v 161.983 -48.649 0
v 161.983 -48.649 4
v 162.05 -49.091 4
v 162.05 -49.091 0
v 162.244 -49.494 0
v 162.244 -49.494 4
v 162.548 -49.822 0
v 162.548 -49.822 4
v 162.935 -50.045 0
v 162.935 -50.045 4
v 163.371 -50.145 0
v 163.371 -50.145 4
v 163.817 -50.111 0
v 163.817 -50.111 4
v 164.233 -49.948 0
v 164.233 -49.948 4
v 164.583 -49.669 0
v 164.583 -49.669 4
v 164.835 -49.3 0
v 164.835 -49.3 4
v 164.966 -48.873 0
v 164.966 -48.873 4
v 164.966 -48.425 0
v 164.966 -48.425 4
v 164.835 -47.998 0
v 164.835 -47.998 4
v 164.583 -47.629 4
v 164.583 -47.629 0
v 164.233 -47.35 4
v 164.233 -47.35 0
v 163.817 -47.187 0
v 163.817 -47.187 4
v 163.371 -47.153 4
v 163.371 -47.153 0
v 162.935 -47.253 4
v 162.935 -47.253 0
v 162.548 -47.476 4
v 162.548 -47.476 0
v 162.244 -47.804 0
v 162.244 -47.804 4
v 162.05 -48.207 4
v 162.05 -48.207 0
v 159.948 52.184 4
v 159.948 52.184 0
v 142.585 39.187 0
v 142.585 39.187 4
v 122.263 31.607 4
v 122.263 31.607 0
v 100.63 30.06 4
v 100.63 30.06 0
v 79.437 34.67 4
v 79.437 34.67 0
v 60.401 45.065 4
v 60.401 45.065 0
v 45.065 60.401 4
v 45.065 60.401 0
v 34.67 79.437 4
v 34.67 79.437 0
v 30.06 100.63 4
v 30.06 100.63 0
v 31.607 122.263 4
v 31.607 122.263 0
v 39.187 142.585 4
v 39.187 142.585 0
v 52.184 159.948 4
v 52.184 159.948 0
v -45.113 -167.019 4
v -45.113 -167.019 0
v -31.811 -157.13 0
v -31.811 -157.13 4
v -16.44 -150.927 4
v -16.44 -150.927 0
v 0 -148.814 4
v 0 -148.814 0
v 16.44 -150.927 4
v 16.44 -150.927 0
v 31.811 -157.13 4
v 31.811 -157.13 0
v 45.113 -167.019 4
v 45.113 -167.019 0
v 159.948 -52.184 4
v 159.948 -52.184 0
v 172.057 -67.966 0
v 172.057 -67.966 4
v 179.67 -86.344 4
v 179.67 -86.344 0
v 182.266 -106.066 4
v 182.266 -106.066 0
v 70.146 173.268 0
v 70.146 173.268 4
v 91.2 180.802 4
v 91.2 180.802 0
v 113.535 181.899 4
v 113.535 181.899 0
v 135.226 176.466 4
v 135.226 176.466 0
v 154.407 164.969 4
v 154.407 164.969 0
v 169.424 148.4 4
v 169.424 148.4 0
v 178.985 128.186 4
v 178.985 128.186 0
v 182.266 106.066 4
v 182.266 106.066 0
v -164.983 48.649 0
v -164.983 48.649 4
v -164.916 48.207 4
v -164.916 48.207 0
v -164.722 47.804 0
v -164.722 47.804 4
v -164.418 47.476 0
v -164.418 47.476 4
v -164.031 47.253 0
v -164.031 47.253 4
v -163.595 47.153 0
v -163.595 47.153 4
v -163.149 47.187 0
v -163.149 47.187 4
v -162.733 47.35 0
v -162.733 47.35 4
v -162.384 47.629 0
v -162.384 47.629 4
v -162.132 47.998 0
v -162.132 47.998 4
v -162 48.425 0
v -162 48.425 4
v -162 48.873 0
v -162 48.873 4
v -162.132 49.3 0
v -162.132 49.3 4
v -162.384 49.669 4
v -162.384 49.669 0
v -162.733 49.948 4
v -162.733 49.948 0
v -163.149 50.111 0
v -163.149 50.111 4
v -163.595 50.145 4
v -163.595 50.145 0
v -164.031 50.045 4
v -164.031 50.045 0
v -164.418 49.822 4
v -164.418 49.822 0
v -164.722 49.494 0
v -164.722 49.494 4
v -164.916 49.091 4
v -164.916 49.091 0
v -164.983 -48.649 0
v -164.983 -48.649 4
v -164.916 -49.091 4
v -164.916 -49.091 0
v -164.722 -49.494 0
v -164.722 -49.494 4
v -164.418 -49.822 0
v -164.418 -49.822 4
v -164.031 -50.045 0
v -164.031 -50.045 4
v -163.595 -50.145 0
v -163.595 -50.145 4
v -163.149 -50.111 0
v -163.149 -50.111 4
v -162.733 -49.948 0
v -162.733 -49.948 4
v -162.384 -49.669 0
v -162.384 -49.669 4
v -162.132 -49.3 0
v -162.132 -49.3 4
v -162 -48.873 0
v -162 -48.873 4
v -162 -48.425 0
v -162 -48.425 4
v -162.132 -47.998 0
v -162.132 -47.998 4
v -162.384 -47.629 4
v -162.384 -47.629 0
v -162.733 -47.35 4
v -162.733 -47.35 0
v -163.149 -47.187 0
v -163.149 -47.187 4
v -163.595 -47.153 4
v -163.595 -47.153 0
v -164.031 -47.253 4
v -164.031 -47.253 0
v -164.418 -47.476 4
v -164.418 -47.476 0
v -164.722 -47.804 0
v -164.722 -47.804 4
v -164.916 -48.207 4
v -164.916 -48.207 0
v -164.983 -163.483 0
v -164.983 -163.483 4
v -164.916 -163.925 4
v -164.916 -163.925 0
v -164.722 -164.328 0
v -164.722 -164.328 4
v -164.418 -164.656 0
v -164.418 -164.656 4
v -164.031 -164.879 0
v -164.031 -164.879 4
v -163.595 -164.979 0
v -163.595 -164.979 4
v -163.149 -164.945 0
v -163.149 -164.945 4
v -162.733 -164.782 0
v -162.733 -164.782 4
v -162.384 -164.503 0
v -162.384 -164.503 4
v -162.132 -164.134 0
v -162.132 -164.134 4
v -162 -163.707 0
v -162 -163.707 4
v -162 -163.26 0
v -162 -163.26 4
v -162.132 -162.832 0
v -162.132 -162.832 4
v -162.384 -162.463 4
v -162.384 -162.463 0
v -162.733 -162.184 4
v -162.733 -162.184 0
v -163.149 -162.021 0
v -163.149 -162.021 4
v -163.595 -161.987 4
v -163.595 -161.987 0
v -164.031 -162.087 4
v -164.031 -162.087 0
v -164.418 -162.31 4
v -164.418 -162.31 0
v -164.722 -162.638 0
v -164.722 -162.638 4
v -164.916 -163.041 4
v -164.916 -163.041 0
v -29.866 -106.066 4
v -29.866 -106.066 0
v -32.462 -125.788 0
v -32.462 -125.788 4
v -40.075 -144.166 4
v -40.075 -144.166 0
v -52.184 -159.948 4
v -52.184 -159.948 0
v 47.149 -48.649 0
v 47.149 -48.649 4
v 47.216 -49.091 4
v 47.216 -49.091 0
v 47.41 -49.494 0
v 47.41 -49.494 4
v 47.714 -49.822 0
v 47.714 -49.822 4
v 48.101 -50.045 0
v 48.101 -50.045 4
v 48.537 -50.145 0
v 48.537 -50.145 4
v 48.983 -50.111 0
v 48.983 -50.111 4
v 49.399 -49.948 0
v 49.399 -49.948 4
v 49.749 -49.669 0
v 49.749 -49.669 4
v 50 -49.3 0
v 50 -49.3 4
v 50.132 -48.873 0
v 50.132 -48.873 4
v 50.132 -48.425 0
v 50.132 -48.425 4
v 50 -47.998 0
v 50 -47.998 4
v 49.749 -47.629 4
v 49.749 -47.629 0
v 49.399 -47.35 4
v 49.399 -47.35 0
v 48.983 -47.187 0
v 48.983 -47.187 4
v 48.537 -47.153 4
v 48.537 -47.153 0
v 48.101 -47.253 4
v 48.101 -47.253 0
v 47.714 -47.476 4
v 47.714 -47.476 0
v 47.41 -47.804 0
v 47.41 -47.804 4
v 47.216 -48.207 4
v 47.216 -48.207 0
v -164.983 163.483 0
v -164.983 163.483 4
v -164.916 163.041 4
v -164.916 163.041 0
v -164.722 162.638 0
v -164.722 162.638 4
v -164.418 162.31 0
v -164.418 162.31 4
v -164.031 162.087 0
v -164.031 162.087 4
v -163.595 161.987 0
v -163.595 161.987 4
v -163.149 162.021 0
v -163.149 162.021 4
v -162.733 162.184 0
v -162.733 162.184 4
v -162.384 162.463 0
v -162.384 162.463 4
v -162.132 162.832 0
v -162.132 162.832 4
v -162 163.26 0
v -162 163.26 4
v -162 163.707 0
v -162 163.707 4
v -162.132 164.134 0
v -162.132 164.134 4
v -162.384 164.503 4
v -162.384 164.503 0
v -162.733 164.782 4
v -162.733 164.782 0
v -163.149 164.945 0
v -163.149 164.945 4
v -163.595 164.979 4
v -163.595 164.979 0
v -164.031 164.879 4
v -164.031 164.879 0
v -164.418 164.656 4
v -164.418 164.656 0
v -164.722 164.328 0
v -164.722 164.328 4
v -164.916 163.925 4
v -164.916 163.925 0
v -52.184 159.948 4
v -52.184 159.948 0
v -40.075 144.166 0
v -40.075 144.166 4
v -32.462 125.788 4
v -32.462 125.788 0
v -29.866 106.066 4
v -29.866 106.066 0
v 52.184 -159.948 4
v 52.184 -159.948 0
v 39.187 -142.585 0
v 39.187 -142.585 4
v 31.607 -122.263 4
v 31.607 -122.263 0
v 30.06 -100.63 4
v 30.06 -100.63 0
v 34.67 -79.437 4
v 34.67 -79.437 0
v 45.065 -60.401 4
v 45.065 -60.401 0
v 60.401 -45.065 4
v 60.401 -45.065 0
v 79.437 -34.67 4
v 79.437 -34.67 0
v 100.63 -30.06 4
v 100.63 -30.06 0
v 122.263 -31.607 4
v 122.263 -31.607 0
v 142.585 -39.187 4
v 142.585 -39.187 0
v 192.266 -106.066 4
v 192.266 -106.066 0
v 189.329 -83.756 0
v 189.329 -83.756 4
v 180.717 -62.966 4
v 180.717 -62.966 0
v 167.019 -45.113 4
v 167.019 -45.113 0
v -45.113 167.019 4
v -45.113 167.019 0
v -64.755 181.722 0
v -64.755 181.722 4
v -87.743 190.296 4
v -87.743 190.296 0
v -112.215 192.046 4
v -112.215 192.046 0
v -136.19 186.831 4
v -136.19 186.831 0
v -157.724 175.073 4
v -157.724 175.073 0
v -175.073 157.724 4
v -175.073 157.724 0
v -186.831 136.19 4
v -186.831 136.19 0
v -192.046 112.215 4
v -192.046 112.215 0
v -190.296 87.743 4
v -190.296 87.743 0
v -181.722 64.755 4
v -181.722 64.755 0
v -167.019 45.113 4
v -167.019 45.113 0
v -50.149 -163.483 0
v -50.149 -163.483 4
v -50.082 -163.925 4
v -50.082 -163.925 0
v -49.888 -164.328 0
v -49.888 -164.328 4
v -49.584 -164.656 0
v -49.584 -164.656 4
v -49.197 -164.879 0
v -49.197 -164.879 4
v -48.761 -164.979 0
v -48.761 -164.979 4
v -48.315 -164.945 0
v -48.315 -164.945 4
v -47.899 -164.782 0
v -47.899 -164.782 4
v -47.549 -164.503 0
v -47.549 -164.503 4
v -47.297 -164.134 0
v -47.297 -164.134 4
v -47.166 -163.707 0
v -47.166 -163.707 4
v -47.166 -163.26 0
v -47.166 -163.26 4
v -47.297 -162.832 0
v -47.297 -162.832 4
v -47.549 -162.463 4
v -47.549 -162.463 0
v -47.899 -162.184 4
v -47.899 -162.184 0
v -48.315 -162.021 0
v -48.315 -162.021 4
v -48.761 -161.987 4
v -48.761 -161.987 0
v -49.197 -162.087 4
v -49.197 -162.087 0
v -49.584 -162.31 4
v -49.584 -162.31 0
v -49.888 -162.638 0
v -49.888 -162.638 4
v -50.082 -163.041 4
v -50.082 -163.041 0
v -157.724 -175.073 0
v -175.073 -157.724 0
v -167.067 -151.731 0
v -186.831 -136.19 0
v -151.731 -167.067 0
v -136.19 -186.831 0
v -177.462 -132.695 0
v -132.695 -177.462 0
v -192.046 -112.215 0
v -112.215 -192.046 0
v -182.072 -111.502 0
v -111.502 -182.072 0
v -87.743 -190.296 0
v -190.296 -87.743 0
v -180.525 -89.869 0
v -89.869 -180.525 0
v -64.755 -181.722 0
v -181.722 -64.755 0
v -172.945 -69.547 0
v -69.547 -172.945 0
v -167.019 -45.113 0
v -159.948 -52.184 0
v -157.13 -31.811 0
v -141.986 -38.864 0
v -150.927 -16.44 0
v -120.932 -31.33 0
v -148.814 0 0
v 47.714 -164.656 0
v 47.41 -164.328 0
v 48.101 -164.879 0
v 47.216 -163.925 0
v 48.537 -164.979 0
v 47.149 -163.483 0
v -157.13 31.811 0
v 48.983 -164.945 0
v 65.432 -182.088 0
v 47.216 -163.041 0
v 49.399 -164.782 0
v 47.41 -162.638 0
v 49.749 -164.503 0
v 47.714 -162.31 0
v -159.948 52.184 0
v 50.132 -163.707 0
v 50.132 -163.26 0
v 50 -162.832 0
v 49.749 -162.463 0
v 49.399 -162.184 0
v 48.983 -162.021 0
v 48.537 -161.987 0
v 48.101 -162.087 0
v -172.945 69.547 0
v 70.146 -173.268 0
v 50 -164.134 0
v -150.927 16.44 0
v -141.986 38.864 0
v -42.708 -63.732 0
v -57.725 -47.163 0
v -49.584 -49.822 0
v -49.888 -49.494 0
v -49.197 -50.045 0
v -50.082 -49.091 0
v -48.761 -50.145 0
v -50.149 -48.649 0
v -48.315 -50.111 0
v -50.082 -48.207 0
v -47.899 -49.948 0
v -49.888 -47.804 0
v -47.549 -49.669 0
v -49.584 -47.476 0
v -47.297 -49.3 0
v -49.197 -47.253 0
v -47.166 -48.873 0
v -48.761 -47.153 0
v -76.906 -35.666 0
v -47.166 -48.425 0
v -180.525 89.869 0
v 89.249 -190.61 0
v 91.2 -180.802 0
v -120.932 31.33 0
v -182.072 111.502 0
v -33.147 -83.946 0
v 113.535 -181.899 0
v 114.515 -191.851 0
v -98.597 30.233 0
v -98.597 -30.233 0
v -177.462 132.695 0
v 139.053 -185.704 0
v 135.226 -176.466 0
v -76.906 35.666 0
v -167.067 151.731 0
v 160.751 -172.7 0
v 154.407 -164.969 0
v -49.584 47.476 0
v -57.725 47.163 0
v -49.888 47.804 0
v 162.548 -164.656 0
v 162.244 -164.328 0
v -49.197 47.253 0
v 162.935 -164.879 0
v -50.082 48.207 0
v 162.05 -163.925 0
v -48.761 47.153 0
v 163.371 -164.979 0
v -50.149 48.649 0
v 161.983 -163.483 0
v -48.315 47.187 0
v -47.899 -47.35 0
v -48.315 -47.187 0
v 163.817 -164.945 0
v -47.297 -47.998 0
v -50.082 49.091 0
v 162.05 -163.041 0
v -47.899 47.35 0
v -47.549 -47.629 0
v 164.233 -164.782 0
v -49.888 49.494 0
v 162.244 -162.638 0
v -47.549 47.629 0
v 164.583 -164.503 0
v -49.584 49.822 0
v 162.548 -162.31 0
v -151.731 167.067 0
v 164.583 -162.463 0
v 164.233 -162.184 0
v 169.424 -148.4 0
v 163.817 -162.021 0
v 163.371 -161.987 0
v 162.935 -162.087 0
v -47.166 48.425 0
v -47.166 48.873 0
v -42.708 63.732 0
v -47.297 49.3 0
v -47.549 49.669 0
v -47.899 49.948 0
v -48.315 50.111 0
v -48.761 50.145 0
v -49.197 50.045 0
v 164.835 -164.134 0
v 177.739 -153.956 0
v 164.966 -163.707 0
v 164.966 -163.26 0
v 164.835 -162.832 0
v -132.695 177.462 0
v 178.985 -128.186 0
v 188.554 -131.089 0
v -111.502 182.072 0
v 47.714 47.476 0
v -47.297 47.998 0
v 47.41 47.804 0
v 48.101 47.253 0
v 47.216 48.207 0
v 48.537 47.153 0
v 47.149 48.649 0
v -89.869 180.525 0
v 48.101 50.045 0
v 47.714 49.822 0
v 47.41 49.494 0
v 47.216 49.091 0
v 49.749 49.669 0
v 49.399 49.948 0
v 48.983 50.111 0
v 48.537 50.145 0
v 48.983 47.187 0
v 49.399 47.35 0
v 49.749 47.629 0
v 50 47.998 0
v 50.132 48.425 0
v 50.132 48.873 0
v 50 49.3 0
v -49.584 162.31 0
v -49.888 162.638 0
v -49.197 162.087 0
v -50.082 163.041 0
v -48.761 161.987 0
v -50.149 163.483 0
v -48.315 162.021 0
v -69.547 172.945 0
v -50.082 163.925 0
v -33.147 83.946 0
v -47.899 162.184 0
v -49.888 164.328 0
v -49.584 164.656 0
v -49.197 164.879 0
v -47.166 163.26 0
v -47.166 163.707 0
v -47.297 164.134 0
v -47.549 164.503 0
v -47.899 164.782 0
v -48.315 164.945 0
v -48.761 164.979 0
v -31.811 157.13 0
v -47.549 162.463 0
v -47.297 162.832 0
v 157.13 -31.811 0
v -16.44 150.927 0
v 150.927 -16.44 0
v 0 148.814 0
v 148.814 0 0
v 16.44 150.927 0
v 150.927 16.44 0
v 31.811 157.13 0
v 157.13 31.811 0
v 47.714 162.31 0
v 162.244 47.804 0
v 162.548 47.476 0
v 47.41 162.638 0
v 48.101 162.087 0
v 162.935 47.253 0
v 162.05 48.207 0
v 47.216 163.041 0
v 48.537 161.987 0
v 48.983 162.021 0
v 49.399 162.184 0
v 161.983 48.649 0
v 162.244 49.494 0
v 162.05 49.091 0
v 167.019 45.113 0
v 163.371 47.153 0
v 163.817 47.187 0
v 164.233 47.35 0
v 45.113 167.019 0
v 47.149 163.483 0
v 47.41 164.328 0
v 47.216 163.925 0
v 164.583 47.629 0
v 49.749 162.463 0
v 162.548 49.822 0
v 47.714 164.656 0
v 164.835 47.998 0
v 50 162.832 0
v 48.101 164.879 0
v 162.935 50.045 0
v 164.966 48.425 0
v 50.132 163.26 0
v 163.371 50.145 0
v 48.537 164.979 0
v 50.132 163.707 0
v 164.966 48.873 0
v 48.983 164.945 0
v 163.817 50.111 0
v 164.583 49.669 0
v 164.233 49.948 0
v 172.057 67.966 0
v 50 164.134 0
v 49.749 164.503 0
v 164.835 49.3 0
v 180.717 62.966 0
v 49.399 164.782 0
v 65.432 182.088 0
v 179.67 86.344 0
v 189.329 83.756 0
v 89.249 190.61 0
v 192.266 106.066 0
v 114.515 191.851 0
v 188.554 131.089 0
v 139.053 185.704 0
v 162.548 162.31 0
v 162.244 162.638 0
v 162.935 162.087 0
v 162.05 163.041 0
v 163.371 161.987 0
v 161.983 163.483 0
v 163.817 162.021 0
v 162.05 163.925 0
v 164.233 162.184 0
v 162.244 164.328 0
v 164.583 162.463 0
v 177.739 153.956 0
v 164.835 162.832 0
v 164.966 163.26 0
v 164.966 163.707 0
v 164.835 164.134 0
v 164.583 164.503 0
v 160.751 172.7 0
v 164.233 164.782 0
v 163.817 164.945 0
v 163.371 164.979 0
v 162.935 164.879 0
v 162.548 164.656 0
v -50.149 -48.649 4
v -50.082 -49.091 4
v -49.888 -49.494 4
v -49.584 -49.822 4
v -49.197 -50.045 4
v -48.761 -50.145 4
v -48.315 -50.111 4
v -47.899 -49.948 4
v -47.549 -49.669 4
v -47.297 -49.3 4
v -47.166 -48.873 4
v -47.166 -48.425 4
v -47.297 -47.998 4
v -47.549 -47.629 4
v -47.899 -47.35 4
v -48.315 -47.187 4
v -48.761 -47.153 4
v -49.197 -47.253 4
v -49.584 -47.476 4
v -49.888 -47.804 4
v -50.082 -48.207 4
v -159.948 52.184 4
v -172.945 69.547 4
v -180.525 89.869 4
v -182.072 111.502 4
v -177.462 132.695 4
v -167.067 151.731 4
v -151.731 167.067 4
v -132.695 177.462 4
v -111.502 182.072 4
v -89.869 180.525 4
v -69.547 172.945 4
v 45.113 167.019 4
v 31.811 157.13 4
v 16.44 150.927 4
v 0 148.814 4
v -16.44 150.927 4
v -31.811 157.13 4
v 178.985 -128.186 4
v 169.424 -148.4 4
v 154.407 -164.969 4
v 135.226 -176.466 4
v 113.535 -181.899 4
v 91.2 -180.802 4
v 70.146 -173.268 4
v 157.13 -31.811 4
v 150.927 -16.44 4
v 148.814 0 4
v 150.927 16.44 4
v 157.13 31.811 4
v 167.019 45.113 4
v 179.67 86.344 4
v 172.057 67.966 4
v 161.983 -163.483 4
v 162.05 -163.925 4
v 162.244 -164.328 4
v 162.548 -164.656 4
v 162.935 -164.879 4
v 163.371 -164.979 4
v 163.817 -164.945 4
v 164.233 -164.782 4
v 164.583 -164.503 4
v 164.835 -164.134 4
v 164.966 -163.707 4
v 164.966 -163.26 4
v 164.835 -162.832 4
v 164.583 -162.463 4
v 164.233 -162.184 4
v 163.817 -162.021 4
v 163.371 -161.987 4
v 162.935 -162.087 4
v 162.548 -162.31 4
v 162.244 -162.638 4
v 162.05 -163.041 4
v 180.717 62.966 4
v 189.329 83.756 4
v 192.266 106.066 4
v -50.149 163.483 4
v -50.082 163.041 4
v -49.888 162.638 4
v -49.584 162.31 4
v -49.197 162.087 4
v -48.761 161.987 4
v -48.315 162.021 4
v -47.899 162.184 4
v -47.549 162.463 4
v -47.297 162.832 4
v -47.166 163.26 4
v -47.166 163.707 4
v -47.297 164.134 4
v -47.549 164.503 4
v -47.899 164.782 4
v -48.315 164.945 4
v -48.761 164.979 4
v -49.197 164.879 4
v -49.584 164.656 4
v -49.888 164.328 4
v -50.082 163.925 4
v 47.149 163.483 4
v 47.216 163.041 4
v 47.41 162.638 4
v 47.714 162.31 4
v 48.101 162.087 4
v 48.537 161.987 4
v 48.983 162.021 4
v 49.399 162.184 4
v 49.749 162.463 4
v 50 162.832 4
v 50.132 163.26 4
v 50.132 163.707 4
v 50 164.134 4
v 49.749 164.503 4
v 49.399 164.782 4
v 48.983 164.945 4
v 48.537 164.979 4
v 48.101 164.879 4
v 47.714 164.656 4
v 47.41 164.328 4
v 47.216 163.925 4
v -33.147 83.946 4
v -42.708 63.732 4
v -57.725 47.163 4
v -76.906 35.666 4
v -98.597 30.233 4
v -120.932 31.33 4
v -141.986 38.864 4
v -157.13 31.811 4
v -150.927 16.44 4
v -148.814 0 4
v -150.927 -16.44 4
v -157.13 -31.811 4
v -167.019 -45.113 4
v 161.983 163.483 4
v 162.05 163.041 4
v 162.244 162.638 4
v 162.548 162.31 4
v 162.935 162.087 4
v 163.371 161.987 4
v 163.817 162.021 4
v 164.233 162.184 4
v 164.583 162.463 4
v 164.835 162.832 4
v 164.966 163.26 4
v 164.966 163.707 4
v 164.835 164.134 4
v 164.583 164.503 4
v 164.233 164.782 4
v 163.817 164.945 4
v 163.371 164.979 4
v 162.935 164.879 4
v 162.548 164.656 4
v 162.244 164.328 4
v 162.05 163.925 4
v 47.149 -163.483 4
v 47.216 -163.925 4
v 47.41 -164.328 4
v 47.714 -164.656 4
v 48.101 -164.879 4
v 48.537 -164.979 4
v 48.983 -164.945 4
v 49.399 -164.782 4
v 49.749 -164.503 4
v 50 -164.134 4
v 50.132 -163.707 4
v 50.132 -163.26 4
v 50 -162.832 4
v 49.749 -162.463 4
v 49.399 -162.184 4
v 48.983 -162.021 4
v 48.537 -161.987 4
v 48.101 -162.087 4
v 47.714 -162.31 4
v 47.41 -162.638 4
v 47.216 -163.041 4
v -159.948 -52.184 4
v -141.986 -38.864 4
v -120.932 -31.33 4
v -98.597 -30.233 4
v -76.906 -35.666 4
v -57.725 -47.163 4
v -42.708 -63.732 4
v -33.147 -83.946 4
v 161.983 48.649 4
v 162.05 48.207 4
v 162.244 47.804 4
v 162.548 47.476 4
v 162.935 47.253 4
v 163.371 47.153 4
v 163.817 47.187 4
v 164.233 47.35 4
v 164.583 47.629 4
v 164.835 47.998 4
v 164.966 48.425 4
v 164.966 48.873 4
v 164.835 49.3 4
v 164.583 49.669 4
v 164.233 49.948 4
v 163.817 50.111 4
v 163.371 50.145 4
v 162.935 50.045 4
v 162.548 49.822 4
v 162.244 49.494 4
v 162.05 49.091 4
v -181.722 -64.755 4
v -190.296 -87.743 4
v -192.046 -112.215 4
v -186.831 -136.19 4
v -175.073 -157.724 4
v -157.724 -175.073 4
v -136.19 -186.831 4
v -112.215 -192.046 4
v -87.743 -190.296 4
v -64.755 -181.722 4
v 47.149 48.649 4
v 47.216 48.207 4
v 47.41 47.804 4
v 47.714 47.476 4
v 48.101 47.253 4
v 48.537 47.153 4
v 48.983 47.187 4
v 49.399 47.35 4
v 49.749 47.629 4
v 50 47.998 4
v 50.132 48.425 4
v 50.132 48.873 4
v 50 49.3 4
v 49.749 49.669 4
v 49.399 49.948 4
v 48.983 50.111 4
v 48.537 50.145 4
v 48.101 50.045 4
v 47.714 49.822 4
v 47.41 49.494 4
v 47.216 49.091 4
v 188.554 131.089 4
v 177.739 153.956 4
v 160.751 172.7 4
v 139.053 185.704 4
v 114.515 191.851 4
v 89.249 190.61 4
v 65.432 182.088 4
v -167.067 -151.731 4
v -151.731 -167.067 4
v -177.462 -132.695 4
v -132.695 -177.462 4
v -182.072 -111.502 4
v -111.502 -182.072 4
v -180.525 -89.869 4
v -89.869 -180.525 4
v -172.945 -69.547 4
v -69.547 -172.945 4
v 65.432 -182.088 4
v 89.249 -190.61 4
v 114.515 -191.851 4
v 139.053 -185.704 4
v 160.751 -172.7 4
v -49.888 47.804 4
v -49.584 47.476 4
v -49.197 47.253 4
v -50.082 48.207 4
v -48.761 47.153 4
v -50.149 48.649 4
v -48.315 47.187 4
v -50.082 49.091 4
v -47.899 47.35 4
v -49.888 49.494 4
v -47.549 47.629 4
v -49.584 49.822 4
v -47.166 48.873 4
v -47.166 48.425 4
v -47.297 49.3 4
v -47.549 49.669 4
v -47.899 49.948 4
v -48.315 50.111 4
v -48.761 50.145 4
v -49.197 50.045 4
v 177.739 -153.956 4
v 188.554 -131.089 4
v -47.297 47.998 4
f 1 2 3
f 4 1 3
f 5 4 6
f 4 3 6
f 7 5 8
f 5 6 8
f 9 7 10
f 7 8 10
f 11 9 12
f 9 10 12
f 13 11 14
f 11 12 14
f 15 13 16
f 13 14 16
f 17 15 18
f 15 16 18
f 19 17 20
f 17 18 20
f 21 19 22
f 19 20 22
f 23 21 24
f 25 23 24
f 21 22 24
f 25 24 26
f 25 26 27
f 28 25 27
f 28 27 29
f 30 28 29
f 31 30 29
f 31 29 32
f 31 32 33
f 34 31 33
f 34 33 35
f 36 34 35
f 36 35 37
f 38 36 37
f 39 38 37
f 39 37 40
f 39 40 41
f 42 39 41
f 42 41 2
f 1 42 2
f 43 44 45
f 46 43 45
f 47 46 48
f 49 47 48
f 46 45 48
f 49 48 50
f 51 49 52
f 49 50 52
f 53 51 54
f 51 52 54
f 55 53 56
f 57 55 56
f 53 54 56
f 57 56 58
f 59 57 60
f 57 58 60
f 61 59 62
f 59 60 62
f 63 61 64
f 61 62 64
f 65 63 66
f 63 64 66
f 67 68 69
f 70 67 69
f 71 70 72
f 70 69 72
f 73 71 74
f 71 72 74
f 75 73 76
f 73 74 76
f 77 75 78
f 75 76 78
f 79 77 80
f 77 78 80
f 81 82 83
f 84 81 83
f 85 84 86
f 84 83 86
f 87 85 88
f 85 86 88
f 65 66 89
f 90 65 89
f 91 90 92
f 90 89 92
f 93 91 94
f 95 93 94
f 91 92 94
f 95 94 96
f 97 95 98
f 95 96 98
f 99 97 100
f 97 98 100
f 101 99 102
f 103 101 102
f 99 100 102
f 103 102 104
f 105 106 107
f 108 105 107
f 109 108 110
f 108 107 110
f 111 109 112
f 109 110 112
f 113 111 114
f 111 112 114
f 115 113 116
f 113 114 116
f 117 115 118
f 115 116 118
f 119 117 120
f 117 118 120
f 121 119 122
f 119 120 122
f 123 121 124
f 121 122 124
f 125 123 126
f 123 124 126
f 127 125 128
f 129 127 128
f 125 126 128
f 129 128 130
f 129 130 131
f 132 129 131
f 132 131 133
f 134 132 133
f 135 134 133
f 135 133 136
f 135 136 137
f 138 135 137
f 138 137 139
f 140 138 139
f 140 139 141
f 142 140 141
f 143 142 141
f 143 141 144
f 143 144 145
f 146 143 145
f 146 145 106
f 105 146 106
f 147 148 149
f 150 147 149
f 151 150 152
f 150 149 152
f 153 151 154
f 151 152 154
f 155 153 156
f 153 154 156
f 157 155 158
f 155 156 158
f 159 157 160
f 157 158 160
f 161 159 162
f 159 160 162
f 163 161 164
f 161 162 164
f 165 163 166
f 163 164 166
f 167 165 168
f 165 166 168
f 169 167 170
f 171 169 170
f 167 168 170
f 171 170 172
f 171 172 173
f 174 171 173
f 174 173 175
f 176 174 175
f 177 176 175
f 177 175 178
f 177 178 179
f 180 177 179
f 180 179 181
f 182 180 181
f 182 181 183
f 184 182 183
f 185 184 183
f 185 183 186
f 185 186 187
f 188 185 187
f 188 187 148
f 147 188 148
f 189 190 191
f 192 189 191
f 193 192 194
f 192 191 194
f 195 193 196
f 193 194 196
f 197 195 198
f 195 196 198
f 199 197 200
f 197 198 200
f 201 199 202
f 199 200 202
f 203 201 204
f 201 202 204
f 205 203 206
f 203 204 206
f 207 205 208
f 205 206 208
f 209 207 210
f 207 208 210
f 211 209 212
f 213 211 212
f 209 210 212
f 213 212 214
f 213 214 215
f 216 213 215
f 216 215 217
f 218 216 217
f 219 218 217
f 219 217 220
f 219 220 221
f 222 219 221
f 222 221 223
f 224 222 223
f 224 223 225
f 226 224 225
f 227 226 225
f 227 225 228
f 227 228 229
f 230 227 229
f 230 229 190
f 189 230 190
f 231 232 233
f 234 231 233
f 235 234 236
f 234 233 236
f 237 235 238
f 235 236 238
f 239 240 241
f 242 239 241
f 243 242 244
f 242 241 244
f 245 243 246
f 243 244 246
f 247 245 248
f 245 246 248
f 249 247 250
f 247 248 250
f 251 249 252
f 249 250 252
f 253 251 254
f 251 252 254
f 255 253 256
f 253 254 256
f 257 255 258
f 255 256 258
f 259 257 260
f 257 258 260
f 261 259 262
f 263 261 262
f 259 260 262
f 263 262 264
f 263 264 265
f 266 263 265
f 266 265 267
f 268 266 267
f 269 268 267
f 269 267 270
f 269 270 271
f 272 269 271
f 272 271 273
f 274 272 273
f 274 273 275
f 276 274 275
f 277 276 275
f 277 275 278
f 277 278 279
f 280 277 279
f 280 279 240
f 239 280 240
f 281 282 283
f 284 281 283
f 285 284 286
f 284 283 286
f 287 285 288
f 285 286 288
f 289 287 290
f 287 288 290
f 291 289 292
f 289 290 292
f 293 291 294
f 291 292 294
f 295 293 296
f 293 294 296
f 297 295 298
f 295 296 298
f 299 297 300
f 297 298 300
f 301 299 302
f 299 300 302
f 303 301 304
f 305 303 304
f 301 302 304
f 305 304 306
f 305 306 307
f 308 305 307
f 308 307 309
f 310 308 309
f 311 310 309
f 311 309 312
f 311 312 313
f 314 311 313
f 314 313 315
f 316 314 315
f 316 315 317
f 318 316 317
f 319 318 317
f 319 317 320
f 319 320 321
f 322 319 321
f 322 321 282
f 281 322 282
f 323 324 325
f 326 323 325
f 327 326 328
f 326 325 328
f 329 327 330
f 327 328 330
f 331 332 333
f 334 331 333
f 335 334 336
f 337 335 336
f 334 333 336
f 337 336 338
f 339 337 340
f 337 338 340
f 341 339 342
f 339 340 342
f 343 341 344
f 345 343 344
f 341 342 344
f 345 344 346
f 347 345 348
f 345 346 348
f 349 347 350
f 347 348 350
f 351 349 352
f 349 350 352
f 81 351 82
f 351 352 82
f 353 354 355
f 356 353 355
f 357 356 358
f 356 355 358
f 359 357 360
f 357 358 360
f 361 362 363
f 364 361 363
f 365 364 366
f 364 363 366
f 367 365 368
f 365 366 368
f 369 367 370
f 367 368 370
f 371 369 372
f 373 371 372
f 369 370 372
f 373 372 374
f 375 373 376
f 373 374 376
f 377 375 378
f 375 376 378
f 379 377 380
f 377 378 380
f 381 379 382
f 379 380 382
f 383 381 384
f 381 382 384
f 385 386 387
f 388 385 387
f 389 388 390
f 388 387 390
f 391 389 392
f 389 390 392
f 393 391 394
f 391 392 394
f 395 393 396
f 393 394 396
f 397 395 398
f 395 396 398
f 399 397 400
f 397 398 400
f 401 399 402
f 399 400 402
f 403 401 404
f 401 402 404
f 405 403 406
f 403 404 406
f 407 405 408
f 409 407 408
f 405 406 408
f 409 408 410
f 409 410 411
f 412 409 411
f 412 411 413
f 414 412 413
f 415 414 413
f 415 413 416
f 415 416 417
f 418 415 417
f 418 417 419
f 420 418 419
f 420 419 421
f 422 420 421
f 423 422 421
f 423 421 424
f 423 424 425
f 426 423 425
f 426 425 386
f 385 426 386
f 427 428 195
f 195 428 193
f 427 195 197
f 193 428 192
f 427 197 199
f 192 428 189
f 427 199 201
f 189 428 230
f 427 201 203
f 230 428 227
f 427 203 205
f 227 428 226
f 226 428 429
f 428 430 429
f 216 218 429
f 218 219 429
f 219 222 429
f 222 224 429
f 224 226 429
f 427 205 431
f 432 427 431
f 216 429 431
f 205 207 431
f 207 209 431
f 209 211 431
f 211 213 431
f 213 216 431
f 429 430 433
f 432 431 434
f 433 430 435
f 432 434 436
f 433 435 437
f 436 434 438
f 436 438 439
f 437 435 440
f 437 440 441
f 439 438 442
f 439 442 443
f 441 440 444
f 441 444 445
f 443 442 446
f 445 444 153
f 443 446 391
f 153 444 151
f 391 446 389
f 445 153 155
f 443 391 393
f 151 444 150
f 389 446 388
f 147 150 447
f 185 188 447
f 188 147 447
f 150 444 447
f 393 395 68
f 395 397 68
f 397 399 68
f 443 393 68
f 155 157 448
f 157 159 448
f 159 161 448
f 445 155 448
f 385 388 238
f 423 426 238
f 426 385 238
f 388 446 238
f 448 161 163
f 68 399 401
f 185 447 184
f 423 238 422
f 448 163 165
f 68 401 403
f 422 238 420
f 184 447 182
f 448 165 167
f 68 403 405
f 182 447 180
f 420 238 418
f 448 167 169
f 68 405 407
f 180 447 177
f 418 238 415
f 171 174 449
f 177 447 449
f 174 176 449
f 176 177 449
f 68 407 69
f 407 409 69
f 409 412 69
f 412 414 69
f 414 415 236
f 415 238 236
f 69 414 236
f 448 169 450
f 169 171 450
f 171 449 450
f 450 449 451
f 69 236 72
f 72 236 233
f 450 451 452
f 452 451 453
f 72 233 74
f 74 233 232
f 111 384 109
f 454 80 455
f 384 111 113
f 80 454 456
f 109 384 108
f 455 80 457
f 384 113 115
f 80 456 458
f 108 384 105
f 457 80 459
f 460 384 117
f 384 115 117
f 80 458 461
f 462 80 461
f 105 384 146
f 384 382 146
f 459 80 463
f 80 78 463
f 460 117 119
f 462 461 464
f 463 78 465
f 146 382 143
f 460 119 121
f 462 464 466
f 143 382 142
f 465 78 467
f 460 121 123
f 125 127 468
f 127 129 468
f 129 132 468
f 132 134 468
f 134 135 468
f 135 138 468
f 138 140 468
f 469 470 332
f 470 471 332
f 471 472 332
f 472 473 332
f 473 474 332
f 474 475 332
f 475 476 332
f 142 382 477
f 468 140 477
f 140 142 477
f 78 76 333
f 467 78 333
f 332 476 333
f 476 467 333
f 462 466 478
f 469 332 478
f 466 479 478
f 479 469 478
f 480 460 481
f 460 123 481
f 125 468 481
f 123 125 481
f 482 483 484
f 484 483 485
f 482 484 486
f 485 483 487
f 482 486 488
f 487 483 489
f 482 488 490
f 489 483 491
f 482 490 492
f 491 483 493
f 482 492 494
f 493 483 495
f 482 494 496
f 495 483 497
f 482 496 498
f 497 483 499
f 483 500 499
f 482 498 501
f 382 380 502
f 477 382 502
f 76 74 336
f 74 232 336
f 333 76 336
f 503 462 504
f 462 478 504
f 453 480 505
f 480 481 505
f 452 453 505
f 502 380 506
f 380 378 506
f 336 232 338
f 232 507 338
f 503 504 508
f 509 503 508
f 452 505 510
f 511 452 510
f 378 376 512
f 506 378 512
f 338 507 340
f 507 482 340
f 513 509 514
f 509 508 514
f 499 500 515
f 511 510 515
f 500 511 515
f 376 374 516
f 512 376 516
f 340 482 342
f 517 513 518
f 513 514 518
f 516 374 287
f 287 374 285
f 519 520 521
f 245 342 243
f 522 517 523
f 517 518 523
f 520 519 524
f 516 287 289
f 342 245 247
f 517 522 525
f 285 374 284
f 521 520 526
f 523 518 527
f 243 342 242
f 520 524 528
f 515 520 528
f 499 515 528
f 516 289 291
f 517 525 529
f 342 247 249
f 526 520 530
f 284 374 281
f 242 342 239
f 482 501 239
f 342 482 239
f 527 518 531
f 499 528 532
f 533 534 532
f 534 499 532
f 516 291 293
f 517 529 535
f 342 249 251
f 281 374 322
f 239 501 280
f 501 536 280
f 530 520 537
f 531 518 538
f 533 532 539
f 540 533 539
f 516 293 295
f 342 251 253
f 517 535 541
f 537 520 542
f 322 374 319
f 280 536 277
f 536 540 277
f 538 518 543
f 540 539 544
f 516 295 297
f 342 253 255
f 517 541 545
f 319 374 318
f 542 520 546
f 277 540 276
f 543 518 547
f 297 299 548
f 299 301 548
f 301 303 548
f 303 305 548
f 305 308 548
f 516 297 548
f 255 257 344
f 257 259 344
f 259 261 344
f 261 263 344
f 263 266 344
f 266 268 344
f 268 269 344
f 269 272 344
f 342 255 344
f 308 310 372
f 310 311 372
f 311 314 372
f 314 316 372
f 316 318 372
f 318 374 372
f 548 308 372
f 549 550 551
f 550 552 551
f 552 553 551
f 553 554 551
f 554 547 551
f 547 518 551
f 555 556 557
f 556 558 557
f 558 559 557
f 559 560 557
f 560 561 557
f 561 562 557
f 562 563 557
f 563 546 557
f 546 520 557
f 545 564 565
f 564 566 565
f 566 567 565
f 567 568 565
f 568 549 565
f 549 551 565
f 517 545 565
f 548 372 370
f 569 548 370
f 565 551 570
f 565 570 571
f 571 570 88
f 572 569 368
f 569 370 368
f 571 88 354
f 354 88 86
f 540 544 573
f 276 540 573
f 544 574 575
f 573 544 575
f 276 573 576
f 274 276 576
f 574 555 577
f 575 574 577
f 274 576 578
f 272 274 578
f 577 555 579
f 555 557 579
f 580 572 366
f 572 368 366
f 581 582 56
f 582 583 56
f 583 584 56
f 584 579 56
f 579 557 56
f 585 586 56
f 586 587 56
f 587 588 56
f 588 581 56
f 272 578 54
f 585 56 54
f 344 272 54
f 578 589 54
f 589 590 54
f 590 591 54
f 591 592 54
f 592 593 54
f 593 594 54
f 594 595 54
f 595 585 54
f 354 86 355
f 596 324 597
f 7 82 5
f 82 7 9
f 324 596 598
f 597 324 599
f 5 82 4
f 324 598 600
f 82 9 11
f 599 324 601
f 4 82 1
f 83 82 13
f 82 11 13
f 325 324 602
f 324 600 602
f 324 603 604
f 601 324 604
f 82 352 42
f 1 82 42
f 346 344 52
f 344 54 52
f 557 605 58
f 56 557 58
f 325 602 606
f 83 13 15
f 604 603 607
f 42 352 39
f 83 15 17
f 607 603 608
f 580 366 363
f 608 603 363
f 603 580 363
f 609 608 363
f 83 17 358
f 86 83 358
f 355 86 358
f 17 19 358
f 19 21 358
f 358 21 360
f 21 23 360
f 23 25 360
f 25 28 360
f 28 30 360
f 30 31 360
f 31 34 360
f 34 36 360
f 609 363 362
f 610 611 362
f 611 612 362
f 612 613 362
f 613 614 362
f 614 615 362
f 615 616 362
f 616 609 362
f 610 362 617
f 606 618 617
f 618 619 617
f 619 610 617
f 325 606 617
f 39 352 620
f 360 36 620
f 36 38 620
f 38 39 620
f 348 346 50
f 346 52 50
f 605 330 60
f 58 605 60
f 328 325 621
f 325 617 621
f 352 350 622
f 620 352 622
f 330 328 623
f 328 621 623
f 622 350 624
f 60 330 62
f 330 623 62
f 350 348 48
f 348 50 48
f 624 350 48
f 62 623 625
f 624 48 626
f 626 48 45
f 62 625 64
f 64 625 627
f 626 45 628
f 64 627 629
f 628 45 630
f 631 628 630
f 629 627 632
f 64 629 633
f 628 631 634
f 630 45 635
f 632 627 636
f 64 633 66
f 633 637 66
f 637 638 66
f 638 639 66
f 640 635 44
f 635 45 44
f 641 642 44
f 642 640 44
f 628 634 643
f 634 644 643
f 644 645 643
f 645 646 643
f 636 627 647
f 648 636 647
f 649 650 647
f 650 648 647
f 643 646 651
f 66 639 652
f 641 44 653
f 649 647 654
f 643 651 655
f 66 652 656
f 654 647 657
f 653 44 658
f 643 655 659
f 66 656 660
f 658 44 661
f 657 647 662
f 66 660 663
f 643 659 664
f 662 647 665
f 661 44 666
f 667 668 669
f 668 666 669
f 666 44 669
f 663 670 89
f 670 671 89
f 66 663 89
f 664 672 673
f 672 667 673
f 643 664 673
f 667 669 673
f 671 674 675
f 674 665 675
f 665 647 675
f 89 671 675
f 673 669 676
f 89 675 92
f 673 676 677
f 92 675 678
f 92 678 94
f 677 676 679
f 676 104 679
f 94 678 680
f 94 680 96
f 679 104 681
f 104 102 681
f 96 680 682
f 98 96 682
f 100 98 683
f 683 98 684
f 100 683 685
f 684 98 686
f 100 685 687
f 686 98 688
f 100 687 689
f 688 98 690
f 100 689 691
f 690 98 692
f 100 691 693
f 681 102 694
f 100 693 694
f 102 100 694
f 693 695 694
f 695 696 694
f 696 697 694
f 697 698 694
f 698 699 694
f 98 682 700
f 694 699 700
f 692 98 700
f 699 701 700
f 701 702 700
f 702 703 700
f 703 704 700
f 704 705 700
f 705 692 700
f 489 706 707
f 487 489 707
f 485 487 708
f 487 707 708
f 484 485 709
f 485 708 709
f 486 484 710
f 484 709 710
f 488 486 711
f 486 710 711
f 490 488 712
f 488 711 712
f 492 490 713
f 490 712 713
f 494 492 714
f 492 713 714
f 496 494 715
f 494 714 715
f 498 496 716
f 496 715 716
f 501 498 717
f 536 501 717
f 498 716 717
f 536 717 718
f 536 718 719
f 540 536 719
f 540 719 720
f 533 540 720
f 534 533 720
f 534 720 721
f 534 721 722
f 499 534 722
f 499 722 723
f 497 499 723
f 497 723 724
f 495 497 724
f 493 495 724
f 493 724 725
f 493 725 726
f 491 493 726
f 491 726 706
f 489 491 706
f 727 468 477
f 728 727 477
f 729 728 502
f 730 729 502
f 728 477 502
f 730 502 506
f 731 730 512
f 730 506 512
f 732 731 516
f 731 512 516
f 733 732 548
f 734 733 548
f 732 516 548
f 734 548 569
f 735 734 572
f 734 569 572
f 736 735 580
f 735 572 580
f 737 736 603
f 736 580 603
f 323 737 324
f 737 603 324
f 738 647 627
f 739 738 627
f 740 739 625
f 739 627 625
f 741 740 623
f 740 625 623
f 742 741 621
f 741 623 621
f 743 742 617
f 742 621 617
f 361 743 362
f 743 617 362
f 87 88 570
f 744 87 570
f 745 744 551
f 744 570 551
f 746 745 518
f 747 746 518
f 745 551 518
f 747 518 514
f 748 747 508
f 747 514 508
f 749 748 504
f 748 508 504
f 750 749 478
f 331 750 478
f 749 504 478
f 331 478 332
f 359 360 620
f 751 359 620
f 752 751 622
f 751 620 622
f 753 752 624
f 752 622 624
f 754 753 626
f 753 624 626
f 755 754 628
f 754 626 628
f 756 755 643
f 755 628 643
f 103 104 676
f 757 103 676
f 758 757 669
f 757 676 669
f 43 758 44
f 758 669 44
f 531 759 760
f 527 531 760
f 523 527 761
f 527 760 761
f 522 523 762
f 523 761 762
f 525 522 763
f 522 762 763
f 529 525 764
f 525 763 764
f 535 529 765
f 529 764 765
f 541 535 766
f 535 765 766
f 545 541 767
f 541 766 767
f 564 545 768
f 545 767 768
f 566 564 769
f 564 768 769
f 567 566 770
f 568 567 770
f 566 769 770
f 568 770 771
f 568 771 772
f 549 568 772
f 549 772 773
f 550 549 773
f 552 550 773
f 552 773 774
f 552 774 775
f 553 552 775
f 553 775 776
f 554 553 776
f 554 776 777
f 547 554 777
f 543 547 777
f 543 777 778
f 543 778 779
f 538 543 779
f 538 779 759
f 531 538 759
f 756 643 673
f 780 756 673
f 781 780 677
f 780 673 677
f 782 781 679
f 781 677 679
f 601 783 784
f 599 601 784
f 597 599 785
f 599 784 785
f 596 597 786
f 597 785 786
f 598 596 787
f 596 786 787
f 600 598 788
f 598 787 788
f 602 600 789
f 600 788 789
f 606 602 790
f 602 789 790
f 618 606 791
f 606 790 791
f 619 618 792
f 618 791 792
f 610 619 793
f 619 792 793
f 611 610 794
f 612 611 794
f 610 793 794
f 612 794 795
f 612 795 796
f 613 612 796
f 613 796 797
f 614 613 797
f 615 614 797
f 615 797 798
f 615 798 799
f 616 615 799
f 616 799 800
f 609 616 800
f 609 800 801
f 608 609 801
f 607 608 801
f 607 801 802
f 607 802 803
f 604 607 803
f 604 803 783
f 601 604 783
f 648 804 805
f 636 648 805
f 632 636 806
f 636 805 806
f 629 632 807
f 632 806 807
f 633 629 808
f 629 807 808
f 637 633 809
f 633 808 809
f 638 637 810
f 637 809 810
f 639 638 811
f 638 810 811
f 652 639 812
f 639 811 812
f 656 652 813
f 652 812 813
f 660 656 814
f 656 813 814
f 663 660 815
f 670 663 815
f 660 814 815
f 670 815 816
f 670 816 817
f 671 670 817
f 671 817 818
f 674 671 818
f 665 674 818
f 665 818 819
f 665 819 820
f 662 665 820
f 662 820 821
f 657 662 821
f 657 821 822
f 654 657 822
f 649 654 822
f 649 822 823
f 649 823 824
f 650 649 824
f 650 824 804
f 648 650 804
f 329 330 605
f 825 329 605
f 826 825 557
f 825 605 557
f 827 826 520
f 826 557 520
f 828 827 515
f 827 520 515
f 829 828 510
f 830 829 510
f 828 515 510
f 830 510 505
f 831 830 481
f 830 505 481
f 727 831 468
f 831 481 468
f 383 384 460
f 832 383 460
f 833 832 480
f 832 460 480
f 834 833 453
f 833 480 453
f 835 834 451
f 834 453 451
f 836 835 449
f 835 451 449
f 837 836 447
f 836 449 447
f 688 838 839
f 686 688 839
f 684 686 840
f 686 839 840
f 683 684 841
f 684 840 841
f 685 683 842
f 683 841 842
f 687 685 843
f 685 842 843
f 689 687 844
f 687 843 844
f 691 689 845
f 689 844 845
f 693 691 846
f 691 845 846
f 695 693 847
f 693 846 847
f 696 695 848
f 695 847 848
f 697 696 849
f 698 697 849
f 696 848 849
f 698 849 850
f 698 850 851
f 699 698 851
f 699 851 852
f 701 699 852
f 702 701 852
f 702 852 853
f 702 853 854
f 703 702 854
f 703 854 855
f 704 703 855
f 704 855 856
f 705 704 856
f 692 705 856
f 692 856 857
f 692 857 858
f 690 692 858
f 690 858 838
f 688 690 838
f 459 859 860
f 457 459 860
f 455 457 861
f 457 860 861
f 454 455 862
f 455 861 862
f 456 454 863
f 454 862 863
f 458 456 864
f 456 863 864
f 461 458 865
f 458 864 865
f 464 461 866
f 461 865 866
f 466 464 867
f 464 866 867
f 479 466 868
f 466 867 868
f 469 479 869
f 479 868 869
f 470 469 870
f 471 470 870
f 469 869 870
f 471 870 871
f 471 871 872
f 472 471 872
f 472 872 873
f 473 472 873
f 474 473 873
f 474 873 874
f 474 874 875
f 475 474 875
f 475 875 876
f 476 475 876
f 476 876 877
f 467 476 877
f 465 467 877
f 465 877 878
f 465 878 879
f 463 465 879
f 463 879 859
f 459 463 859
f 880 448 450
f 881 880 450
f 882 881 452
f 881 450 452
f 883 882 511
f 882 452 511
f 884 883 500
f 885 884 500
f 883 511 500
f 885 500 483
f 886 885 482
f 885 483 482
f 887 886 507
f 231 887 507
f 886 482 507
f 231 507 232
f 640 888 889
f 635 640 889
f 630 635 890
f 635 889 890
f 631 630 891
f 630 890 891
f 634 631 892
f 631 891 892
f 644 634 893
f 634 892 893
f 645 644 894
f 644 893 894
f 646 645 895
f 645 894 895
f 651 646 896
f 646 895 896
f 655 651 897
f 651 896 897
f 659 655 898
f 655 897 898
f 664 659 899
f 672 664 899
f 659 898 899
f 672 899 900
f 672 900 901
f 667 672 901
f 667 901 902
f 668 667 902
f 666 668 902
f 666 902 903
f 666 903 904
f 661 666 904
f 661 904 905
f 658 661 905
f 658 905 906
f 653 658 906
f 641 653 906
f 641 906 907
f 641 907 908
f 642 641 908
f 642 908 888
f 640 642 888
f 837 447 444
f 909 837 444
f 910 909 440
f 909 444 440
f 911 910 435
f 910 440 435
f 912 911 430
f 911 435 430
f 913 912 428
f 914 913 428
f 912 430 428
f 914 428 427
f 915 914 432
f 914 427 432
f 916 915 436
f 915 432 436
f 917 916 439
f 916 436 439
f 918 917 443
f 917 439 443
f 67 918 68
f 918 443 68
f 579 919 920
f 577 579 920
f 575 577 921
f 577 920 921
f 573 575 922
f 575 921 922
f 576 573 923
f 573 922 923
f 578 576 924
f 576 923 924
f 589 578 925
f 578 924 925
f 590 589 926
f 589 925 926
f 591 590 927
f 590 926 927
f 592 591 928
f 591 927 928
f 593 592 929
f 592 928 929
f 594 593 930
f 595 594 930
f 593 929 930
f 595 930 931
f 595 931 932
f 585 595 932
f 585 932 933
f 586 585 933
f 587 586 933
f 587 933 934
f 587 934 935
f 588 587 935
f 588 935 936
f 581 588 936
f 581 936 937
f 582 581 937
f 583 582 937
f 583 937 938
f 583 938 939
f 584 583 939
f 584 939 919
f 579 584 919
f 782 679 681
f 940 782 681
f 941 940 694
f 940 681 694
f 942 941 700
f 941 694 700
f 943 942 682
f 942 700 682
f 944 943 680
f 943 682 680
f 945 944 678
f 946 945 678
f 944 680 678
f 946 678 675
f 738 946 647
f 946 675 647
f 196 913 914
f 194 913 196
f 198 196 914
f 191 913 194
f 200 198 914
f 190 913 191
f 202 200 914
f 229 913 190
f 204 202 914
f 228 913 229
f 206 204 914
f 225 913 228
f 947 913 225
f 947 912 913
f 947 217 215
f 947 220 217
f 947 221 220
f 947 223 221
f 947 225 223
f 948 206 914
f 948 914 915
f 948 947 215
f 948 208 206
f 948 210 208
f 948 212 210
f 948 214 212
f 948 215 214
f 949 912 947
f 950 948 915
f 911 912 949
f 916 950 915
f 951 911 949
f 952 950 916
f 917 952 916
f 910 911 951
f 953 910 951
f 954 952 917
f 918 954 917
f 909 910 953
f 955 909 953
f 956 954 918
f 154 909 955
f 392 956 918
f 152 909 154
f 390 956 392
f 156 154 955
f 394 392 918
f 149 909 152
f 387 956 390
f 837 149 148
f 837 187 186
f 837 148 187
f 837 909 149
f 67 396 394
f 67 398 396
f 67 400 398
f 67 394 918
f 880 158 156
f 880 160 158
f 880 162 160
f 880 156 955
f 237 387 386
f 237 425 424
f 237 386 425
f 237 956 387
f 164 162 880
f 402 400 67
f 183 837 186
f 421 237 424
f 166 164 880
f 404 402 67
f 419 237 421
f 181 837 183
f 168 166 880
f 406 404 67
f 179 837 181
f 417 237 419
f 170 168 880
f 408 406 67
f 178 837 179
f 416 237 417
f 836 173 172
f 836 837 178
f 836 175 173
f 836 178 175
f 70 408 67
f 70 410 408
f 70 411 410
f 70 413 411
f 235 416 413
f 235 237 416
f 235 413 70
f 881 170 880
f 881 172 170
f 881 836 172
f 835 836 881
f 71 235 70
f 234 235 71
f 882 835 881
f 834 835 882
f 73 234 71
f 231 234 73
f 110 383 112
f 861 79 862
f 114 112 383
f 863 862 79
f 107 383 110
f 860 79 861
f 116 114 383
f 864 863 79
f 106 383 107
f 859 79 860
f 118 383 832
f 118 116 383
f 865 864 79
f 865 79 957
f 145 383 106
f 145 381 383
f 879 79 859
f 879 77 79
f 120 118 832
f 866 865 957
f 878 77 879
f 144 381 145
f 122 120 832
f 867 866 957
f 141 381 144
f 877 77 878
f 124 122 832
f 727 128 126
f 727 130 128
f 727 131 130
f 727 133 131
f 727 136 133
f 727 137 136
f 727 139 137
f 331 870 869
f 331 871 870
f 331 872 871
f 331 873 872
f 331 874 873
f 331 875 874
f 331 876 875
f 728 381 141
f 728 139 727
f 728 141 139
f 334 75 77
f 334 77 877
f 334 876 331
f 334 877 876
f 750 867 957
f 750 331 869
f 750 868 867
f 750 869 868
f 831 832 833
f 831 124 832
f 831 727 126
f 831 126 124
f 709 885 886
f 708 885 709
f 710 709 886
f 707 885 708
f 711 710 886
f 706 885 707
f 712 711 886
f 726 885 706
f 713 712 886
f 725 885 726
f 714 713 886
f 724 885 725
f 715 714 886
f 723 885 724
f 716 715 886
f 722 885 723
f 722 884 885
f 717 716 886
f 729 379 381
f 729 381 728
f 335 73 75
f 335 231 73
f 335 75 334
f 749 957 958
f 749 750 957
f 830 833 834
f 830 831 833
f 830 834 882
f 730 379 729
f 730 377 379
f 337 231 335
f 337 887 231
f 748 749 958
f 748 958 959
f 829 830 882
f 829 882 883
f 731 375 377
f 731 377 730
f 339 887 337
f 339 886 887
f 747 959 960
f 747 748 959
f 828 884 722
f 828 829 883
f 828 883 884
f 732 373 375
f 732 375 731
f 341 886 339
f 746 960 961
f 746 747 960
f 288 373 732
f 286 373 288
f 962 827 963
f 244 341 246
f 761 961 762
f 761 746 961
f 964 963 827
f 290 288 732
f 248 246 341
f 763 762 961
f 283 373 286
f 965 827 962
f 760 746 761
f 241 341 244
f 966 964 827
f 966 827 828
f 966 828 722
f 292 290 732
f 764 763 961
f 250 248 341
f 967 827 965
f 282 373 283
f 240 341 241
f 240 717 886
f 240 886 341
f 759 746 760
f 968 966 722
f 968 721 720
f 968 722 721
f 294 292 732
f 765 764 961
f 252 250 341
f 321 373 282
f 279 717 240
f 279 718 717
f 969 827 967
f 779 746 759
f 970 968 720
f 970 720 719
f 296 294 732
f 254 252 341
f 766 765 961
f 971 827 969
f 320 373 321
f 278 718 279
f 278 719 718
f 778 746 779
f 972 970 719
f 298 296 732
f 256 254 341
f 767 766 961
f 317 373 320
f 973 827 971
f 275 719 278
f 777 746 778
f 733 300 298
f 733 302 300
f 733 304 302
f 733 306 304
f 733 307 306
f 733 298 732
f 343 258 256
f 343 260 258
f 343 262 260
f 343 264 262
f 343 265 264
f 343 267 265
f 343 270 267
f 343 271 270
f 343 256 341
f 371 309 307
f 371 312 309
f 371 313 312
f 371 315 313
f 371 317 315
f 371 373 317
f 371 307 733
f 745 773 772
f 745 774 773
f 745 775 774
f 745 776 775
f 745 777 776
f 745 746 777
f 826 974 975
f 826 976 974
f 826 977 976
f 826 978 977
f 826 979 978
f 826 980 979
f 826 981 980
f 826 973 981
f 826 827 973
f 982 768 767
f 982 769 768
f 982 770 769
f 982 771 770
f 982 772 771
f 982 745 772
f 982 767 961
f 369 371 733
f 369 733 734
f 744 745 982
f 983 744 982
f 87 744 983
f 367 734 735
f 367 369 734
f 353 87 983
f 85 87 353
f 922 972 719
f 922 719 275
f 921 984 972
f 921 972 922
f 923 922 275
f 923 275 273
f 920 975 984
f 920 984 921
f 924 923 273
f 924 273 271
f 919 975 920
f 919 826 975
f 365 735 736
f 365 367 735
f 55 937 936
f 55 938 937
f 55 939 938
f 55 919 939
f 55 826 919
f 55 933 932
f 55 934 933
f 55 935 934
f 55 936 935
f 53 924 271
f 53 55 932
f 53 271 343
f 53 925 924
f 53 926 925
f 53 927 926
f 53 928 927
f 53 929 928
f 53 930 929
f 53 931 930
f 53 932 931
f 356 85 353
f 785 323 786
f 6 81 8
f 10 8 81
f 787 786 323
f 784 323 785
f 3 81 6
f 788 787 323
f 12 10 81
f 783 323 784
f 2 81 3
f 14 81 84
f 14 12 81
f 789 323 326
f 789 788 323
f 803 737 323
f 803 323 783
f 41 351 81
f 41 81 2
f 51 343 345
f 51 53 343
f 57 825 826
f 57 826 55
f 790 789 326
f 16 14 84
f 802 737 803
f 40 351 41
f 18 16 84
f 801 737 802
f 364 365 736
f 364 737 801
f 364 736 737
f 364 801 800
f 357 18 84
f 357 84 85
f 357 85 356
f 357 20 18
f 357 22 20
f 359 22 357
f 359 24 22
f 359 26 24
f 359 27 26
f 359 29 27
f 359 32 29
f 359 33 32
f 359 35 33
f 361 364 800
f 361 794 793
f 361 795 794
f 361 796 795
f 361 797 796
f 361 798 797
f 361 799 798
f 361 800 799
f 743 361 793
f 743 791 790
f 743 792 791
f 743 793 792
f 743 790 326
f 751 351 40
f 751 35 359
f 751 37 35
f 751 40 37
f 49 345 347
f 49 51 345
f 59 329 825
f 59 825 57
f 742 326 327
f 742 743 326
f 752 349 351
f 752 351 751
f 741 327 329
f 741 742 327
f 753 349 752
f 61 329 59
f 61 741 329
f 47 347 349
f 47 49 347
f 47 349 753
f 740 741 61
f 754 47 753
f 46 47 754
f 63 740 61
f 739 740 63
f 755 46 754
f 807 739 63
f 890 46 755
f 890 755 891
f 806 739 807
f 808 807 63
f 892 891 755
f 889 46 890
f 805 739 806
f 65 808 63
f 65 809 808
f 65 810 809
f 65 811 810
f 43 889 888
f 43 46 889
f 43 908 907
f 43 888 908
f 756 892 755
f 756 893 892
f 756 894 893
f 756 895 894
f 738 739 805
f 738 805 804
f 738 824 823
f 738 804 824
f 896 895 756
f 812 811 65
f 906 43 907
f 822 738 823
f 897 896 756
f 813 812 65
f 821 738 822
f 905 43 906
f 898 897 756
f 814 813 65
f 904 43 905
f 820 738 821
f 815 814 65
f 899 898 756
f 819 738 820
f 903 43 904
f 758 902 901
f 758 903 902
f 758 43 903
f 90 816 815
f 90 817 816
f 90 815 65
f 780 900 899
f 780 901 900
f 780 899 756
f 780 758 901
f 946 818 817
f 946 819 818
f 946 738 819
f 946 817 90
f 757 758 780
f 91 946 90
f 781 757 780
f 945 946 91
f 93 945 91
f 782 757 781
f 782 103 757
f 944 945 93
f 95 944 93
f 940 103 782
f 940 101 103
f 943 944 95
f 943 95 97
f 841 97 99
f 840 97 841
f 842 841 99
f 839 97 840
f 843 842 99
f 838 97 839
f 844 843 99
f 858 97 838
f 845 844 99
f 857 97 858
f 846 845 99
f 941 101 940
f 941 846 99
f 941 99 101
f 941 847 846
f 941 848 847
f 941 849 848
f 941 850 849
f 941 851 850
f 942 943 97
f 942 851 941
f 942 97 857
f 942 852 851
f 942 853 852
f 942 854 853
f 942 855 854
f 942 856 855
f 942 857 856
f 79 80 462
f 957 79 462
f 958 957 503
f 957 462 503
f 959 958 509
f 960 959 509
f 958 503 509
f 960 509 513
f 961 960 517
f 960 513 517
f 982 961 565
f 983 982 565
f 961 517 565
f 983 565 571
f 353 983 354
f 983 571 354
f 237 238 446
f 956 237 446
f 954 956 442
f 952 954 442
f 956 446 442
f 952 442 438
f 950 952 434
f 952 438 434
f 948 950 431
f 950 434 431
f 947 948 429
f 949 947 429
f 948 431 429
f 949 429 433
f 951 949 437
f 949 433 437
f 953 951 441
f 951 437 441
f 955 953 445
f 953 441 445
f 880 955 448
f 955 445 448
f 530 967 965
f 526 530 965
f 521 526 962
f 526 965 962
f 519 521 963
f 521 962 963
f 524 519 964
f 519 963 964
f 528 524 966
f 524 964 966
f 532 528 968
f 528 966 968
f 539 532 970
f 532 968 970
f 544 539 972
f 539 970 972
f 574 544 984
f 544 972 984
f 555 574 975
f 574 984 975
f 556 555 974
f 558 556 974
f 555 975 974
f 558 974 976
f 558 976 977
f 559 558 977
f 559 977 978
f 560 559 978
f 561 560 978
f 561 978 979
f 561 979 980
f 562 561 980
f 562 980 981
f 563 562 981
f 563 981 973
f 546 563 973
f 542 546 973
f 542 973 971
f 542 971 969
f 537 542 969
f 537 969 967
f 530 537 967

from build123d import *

# Parameters (mm, degrees)
F1_DEPTH = 4
F2_D     = 3


with BuildPart() as f1:
    # F0 (on Top) → F1 (new body)
    with BuildSketch(Plane.XY):
        with BuildLine():
            ThreePointArc((-52.18448, 159.947554), (-35.666397, 135.226495), (-29.866017, 106.066017))
            ThreePointArc((-29.866017, 106.066017), (-76.90554, 35.666397), (-159.947554, 52.18448))
            Line((-159.947554, 52.18448), (-167.018622, 45.113413))
            ThreePointArc((-167.018622, 45.113413), (-73.078705, 26.427601), (-19.866017, 106.066017))
            ThreePointArc((-19.866017, 106.066017), (-26.427601, 139.053329), (-45.113413, 167.018622))
            Line((-45.113413, 167.018622), (-52.18448, 159.947554))
        make_face()
        with BuildLine():
            ThreePointArc((-159.947554, 52.18448), (-159.947554, 159.947554), (-52.18448, 159.947554))
            Line((-52.18448, 159.947554), (-45.113413, 167.018622))
            ThreePointArc((-45.113413, 167.018622), (-167.018622, 167.018622), (-167.018622, 45.113413))
            Line((-167.018622, 45.113413), (-159.947554, 52.18448))
        make_face()
        with BuildLine():
            ThreePointArc((45.113413, 167.018622), (0, 148.813707), (-45.113413, 167.018622))
            ThreePointArc((-45.113413, 167.018622), (-26.427601, 139.053329), (-19.866017, 106.066017))
            ThreePointArc((-19.866017, 106.066017), (-73.078705, 26.427601), (-167.018622, 45.113413))
            ThreePointArc((-167.018622, 45.113413), (-148.813707, 0), (-167.018622, -45.113413))
            ThreePointArc((-167.018622, -45.113413), (-73.078705, -26.427601), (-19.866017, -106.066017))
            ThreePointArc((-19.866017, -106.066017), (-26.427601, -139.053329), (-45.113413, -167.018622))
            ThreePointArc((-45.113413, -167.018622), (0, -148.813707), (45.113413, -167.018622))
            ThreePointArc((45.113413, -167.018622), (45.113413, -45.113413), (167.018622, -45.113413))
            ThreePointArc((167.018622, -45.113413), (148.813707, 0), (167.018622, 45.113413))
            ThreePointArc((167.018622, 45.113413), (45.113413, 45.113413), (45.113413, 167.018622))
        make_face()
        with BuildLine():
            Line((52.18448, 159.947554), (45.113413, 167.018622))
            ThreePointArc((45.113413, 167.018622), (45.113413, 45.113413), (167.018622, 45.113413))
            Line((167.018622, 45.113413), (159.947554, 52.18448))
            ThreePointArc((159.947554, 52.18448), (52.18448, 52.18448), (52.18448, 159.947554))
        make_face()
        with BuildLine():
            ThreePointArc((192.266017, 106.066017), (139.053329, 185.704433), (45.113413, 167.018622))
            Line((45.113413, 167.018622), (52.18448, 159.947554))
            ThreePointArc((52.18448, 159.947554), (135.226495, 176.465638), (182.266017, 106.066017))
            ThreePointArc((182.266017, 106.066017), (176.465638, 76.90554), (159.947554, 52.18448))
            Line((159.947554, 52.18448), (167.018622, 45.113413))
            ThreePointArc((167.018622, 45.113413), (185.704433, 73.078705), (192.266017, 106.066017))
        make_face()
        with BuildLine():
            Line((159.947554, -52.18448), (167.018622, -45.113413))
            ThreePointArc((167.018622, -45.113413), (45.113413, -45.113413), (45.113413, -167.018622))
            Line((45.113413, -167.018622), (52.18448, -159.947554))
            ThreePointArc((52.18448, -159.947554), (52.18448, -52.18448), (159.947554, -52.18448))
        make_face()
        with BuildLine():
            ThreePointArc((192.266017, -106.066017), (185.704433, -73.078705), (167.018622, -45.113413))
            Line((167.018622, -45.113413), (159.947554, -52.18448))
            ThreePointArc((159.947554, -52.18448), (176.465638, -76.90554), (182.266017, -106.066017))
            ThreePointArc((182.266017, -106.066017), (135.226495, -176.465638), (52.18448, -159.947554))
            Line((52.18448, -159.947554), (45.113413, -167.018622))
            ThreePointArc((45.113413, -167.018622), (139.053329, -185.704433), (192.266017, -106.066017))
        make_face()
        with BuildLine():
            Line((-159.947554, -52.18448), (-167.018622, -45.113413))
            ThreePointArc((-167.018622, -45.113413), (-167.018622, -167.018622), (-45.113413, -167.018622))
            Line((-45.113413, -167.018622), (-52.18448, -159.947554))
            ThreePointArc((-52.18448, -159.947554), (-159.947554, -159.947554), (-159.947554, -52.18448))
        make_face()
        with BuildLine():
            ThreePointArc((-19.866017, -106.066017), (-73.078705, -26.427601), (-167.018622, -45.113413))
            Line((-167.018622, -45.113413), (-159.947554, -52.18448))
            ThreePointArc((-159.947554, -52.18448), (-76.90554, -35.666397), (-29.866017, -106.066017))
            ThreePointArc((-29.866017, -106.066017), (-35.666397, -135.226495), (-52.18448, -159.947554))
            Line((-52.18448, -159.947554), (-45.113413, -167.018622))
            ThreePointArc((-45.113413, -167.018622), (-26.427601, -139.053329), (-19.866017, -106.066017))
        make_face()
    extrude(amount=F1_DEPTH)

    # F2 (through all)
    with Locations(Plane(origin=(0, 0, 0), x_dir=(1, 0, 0), z_dir=(0, 0, -1))):
        with Locations((-163.483088, 163.483088), (-48.648947, 163.483088), (-48.648947, 48.648947), (-163.483088, 48.648947), (-163.483088, -48.648947), (-48.648947, -48.648947), (-48.648947, -163.483088), (-163.483088, -163.483088), (48.648947, -163.483088), (48.648947, -48.648947), (163.483088, -48.648947), (163.483088, -163.483088), (163.483088, 163.483088), (163.483088, 48.648947), (48.648947, 48.648947), (48.648947, 163.483088)):
            Hole(F2_D / 2)


solid = f1.part
